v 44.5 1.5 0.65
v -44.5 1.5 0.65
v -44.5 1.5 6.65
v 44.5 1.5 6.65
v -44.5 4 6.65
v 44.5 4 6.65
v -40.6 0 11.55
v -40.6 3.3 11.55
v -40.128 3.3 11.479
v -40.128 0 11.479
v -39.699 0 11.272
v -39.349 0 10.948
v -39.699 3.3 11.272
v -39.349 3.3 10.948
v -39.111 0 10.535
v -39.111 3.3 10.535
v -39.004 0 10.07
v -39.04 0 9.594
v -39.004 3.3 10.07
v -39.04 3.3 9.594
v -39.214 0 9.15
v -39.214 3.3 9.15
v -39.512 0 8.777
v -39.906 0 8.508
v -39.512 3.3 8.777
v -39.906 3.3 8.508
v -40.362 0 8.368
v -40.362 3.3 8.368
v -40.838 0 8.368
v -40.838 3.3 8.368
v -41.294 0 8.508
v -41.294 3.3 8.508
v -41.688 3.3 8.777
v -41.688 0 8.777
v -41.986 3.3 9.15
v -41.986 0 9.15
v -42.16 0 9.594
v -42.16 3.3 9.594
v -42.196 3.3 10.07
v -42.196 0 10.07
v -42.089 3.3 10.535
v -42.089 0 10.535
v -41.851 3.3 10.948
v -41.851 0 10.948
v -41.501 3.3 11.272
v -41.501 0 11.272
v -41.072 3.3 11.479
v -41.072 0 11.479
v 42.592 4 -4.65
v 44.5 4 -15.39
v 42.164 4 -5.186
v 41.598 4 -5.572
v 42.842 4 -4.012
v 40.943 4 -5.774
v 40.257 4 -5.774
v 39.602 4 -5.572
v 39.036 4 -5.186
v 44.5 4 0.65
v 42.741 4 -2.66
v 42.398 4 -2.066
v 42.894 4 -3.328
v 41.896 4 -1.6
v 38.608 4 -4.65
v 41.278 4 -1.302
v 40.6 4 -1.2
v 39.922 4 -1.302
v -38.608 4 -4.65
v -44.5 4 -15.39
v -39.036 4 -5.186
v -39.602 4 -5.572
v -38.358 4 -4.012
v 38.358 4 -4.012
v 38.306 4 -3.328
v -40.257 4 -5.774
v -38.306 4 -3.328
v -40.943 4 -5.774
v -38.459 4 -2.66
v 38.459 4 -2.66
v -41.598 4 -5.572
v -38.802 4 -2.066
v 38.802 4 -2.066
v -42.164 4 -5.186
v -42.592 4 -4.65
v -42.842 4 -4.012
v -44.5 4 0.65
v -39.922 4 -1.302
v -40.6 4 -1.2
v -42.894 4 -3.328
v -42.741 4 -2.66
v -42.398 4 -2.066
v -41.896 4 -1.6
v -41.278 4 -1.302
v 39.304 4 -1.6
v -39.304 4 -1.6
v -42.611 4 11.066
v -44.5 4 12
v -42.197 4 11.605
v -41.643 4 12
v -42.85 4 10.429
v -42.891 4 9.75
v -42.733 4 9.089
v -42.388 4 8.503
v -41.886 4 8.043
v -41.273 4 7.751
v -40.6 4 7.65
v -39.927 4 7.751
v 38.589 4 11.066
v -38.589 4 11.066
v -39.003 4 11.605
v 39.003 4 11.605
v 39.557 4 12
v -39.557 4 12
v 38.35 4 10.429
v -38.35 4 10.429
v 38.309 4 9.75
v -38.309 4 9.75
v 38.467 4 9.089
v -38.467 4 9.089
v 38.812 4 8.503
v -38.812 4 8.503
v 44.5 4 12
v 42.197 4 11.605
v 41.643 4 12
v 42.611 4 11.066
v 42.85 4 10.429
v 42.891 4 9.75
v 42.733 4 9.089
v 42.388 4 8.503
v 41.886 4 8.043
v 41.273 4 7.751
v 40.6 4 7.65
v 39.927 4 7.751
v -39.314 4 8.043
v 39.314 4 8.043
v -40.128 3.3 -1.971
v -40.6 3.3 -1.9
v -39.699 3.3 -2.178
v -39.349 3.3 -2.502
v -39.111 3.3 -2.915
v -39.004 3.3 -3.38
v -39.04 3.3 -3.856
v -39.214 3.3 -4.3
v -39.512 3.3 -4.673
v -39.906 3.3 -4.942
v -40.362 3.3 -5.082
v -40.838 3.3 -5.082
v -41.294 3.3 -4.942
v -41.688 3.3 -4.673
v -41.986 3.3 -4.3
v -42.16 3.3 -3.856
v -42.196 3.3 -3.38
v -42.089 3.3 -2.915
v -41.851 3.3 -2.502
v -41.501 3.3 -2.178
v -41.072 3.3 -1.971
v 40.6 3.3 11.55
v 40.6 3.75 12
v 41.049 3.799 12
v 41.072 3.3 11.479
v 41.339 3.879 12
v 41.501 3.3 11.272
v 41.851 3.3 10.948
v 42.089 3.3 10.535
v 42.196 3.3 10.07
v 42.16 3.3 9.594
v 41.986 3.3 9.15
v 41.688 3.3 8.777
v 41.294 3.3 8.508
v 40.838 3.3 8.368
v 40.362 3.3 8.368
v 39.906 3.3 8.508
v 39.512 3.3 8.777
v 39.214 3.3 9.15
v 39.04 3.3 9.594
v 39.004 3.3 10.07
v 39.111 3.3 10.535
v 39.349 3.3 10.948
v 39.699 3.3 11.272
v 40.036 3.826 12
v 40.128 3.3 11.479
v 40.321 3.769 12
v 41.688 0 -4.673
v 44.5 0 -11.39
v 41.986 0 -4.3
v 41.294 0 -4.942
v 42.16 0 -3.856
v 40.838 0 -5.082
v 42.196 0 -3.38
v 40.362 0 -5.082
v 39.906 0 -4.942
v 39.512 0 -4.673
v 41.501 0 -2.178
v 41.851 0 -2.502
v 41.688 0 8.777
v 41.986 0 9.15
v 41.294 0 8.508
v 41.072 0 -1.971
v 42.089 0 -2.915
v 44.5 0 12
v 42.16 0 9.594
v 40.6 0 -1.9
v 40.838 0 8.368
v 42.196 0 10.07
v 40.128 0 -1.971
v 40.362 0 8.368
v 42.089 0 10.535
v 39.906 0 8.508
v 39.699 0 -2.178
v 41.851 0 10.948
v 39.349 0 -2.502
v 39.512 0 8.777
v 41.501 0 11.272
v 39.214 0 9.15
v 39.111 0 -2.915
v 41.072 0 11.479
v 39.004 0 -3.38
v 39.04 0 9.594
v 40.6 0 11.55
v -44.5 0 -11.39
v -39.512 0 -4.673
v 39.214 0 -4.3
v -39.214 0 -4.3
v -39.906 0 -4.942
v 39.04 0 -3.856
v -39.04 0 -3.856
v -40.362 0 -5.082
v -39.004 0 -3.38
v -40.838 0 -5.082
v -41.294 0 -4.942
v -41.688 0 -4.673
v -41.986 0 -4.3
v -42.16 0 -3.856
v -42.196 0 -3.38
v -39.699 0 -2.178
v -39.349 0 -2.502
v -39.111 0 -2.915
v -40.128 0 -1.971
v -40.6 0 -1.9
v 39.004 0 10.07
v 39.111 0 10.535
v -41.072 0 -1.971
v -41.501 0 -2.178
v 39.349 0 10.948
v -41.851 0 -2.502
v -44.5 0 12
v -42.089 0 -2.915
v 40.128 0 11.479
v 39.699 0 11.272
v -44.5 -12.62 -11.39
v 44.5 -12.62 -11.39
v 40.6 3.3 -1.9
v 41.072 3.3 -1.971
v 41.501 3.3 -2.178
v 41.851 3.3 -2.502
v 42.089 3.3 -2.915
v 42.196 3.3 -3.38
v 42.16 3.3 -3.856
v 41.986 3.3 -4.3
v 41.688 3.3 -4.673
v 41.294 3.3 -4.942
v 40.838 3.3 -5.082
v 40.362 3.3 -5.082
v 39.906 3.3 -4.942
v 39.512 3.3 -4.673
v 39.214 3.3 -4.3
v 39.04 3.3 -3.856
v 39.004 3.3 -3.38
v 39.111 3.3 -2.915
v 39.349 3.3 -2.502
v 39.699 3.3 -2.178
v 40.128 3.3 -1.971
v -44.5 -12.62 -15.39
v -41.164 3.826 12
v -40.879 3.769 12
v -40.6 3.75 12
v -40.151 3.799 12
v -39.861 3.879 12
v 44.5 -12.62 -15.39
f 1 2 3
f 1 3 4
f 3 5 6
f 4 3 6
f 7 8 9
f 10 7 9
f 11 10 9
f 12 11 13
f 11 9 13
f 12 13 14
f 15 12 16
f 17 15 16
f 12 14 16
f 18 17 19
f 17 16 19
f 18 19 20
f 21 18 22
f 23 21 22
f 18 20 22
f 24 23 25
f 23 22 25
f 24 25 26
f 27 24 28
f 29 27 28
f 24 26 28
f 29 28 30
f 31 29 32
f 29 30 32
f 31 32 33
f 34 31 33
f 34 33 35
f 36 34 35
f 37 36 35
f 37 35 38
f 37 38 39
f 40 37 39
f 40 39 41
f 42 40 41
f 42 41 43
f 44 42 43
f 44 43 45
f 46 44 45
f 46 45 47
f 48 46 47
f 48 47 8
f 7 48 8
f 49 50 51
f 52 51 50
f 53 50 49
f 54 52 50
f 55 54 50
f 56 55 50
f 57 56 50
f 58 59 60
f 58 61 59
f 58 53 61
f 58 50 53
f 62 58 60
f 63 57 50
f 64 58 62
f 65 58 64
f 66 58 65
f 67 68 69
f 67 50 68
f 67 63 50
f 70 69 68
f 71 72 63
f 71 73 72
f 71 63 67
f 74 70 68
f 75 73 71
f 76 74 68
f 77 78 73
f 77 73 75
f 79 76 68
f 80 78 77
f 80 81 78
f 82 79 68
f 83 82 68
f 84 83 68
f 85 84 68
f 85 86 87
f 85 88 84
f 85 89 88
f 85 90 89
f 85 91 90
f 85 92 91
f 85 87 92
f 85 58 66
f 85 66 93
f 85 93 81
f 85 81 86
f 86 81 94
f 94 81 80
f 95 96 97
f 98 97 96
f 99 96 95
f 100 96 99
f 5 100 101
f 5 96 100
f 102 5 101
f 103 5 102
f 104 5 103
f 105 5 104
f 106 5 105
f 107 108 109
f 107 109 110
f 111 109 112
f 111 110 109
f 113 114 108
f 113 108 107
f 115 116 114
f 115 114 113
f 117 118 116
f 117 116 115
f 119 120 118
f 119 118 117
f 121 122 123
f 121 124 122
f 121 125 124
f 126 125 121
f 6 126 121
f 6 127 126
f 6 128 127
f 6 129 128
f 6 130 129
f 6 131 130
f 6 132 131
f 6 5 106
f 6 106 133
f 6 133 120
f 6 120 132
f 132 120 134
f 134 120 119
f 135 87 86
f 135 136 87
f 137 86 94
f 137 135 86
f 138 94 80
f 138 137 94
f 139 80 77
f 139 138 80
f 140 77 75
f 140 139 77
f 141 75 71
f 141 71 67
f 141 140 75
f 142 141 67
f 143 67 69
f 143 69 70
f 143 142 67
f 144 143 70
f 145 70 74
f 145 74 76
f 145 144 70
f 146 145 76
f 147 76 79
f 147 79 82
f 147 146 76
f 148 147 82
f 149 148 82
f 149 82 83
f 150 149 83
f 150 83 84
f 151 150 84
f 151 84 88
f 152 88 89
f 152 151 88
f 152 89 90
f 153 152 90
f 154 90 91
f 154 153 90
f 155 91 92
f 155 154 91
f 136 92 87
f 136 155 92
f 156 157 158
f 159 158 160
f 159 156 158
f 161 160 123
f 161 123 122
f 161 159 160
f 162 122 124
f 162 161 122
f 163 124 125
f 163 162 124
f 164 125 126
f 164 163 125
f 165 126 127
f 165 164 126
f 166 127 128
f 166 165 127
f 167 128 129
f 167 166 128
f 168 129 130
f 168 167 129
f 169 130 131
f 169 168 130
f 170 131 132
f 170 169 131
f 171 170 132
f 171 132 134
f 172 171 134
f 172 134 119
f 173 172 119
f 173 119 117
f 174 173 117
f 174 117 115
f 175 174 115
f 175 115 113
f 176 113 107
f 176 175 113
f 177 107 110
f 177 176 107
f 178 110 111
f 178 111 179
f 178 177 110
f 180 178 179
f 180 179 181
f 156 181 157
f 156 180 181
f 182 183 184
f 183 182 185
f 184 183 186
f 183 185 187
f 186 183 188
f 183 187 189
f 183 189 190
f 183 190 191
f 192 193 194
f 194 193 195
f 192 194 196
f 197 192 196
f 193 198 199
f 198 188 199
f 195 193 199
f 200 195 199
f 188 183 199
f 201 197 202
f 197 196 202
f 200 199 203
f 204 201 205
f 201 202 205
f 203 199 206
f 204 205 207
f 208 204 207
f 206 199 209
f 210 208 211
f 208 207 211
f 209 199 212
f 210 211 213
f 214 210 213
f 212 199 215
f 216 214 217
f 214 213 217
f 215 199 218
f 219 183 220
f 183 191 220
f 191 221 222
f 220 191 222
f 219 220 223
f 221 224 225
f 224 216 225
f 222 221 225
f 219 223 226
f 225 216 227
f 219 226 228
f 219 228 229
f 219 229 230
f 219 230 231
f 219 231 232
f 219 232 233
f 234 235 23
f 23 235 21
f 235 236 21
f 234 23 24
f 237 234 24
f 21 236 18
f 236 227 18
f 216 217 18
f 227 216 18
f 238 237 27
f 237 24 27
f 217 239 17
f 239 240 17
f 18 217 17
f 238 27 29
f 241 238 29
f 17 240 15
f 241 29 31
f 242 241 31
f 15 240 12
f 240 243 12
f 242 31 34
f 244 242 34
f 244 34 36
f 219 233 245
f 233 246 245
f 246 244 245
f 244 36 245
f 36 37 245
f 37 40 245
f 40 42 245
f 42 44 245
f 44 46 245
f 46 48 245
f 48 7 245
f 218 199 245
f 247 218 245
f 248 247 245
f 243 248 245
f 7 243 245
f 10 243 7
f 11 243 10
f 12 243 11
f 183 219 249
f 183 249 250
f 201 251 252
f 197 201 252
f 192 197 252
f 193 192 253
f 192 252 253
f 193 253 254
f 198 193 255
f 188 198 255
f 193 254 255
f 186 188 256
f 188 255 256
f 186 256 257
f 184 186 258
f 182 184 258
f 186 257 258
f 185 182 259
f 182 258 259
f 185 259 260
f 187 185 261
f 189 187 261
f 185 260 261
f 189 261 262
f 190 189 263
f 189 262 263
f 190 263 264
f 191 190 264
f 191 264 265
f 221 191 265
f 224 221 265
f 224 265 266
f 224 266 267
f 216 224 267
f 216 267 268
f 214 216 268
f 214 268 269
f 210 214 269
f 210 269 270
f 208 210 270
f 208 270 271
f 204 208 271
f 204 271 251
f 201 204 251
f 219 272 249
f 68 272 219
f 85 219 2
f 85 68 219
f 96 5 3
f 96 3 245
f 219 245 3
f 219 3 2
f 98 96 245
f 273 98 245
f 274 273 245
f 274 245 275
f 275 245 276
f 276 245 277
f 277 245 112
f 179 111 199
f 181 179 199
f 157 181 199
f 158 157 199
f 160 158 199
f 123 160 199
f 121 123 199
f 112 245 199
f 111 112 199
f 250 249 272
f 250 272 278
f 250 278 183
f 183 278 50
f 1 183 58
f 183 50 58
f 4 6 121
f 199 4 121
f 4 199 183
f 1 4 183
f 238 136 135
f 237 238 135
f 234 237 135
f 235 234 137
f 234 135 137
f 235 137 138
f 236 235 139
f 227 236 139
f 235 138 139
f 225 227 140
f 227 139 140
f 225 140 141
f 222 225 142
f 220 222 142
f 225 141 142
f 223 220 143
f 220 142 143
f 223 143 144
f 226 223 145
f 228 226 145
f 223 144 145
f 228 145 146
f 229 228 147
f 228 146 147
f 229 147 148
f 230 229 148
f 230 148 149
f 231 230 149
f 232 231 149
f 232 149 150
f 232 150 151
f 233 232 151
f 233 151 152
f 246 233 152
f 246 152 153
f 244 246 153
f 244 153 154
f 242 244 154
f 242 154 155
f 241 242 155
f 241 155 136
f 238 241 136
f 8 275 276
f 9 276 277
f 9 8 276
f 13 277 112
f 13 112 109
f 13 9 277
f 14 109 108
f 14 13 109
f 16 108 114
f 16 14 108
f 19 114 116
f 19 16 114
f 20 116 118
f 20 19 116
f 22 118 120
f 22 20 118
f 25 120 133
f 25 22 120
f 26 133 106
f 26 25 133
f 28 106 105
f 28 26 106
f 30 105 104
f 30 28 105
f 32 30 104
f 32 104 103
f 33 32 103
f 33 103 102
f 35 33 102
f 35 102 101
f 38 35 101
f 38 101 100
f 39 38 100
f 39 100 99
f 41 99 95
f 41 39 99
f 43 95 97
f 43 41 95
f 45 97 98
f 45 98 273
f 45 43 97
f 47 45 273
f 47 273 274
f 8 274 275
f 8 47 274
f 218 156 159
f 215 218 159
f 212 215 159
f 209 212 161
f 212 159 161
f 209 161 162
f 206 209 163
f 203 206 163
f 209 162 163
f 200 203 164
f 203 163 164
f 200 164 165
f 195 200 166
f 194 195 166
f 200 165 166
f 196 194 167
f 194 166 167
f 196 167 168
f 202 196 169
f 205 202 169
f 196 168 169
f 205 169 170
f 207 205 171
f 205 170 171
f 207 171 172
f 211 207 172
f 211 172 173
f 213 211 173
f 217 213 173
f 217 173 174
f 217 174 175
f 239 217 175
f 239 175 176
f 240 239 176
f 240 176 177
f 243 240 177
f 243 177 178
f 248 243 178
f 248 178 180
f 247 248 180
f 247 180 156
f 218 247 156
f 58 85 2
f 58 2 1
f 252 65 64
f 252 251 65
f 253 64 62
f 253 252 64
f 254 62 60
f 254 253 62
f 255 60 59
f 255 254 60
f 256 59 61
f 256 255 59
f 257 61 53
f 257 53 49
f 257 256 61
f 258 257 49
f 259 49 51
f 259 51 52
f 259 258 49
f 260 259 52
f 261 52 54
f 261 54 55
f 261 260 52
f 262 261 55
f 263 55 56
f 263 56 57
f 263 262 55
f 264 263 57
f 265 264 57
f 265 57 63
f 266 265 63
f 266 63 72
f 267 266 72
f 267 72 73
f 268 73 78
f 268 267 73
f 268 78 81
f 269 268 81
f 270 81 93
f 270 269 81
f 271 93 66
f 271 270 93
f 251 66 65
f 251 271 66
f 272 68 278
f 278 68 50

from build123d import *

# Parameters (mm, degrees)
SKETCH1_W           = 89
SKETCH1_H           = 24
BOSS_EXTRUDE1_DEPTH = 4
SKETCH2_R           = 1.6
CUT_EXTRUDE1_DEPTH  = 47.262836057
CHAMFER1_SIZE       = 0.7
SKETCH3_W           = 89
SKETCH3_H           = 6
CUT_EXTRUDE2_DEPTH  = 2.5
SKETCH4_W           = 89
SKETCH4_H           = 4
BOSS_EXTRUDE2_DEPTH = 3.39
SKETCH5_W           = 89
SKETCH5_H           = 4
BOSS_EXTRUDE3_DEPTH = 12.62


with BuildPart() as part:
    # Sketch1 → Boss-Extrude1 (new body)
    with BuildSketch(Plane(origin=(0, 0, 0), x_dir=(1, 0, 0), z_dir=(0, 1, 0))):
        Rectangle(SKETCH1_W, SKETCH1_H)
    extrude(amount=BOSS_EXTRUDE1_DEPTH)

    # Sketch2 → Cut-Extrude1 (cut, through all)
    with BuildSketch(Plane(origin=(0, 4, 0), x_dir=(1, 0, 0), z_dir=(0, 1, 0))):
        with Locations(Location((-40.6, 3.5, 0), (0, 0, 270))):
            Circle(SKETCH2_R)
        with Locations(Location((-40.6, -9.95, 0), (0, 0, 270))):
            Circle(SKETCH2_R)
        with Locations(Location((40.6, 3.5, 0), (0, 0, 270))):
            Circle(SKETCH2_R)
        with Locations(Location((40.6, -9.95, 0), (0, 0, 270))):
            Circle(SKETCH2_R)
    extrude(amount=-CUT_EXTRUDE1_DEPTH, mode=Mode.SUBTRACT)

    # Chamfer1
    # the kernel refuses this chamfer: 0.7 mm, written as the material it takes off along each edge
    with BuildSketch(Plane(origin=(40.6, 4, 9.95), x_dir=(0, 0, 1), z_dir=(-1, 0, 0))) as chamfer1_piece_1:
        Polygon((1.6 + CHAMFER1_SIZE, 0), (1.6, -CHAMFER1_SIZE), (1.6, 0), align=None)
    revolve(axis=Axis((40.6, 4, 9.95), (0, 1, 0)), mode=Mode.SUBTRACT)
    with BuildSketch(Plane(origin=(-40.6, 4, -3.5), x_dir=(0, 0, 1), z_dir=(-1, 0, 0))) as chamfer1_piece_2:
        Polygon((1.6 + CHAMFER1_SIZE, 0), (1.6, -CHAMFER1_SIZE), (1.6, 0), align=None)
    revolve(axis=Axis((-40.6, 4, -3.5), (0, 1, 0)), mode=Mode.SUBTRACT)
    with BuildSketch(Plane(origin=(40.6, 4, -3.5), x_dir=(0, 0, 1), z_dir=(-1, 0, 0))) as chamfer1_piece_3:
        Polygon((1.6 + CHAMFER1_SIZE, 0), (1.6, -CHAMFER1_SIZE), (1.6, 0), align=None)
    revolve(axis=Axis((40.6, 4, -3.5), (0, 1, 0)), mode=Mode.SUBTRACT)
    with BuildSketch(Plane(origin=(-40.6, 4, 9.95), x_dir=(0, 0, 1), z_dir=(-1, 0, 0))) as chamfer1_piece_4:
        Polygon((1.6 + CHAMFER1_SIZE, 0), (1.6, -CHAMFER1_SIZE), (1.6, 0), align=None)
    revolve(axis=Axis((-40.6, 4, 9.95), (0, 1, 0)), mode=Mode.SUBTRACT)

    # Sketch3 → Cut-Extrude2 (cut)
    with BuildSketch(Plane(origin=(0, 4, 0), x_dir=(1, 0, 0), z_dir=(0, 1, 0))):
        with Locations((0, -3.65)):
            Rectangle(SKETCH3_W, SKETCH3_H)
    extrude(amount=-CUT_EXTRUDE2_DEPTH, mode=Mode.SUBTRACT)

    # Sketch4 → Boss-Extrude2 (add)
    with BuildSketch(Plane(origin=(0, 0, -12), x_dir=(-1, 0, 0), z_dir=(0, 0, -1))):
        with Locations((0, 2)):
            Rectangle(SKETCH4_W, SKETCH4_H)
    extrude(amount=BOSS_EXTRUDE2_DEPTH)

    # Sketch5 → Boss-Extrude3 (add)
    with BuildSketch(Plane.XZ):
        with Locations((0, -13.39)):
            Rectangle(SKETCH5_W, SKETCH5_H)
    extrude(amount=BOSS_EXTRUDE3_DEPTH)


solid = part.part
